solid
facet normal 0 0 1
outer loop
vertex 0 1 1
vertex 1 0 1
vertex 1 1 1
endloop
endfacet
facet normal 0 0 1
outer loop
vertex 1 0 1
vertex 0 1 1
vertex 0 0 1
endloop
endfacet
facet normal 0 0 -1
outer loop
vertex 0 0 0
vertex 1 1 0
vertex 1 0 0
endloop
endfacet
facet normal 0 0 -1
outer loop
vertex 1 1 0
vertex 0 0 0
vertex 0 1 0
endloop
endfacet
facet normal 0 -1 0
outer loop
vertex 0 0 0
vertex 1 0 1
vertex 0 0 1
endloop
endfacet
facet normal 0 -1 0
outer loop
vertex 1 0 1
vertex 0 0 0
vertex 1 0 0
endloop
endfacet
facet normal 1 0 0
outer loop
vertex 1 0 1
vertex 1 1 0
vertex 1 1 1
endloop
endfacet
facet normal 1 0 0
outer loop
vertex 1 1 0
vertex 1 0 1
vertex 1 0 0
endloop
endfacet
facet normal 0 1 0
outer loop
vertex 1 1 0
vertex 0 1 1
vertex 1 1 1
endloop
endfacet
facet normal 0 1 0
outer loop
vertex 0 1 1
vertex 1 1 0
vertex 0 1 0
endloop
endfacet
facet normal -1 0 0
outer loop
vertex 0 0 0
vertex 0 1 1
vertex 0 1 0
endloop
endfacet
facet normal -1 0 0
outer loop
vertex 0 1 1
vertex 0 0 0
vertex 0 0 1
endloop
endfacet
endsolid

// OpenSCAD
module knob(c = "red") color(c) cylinder(h = 3, r = 4);
module odd() color("rosarot") cube(3);
color("blue") cube(1); // top-level geometry of lib
